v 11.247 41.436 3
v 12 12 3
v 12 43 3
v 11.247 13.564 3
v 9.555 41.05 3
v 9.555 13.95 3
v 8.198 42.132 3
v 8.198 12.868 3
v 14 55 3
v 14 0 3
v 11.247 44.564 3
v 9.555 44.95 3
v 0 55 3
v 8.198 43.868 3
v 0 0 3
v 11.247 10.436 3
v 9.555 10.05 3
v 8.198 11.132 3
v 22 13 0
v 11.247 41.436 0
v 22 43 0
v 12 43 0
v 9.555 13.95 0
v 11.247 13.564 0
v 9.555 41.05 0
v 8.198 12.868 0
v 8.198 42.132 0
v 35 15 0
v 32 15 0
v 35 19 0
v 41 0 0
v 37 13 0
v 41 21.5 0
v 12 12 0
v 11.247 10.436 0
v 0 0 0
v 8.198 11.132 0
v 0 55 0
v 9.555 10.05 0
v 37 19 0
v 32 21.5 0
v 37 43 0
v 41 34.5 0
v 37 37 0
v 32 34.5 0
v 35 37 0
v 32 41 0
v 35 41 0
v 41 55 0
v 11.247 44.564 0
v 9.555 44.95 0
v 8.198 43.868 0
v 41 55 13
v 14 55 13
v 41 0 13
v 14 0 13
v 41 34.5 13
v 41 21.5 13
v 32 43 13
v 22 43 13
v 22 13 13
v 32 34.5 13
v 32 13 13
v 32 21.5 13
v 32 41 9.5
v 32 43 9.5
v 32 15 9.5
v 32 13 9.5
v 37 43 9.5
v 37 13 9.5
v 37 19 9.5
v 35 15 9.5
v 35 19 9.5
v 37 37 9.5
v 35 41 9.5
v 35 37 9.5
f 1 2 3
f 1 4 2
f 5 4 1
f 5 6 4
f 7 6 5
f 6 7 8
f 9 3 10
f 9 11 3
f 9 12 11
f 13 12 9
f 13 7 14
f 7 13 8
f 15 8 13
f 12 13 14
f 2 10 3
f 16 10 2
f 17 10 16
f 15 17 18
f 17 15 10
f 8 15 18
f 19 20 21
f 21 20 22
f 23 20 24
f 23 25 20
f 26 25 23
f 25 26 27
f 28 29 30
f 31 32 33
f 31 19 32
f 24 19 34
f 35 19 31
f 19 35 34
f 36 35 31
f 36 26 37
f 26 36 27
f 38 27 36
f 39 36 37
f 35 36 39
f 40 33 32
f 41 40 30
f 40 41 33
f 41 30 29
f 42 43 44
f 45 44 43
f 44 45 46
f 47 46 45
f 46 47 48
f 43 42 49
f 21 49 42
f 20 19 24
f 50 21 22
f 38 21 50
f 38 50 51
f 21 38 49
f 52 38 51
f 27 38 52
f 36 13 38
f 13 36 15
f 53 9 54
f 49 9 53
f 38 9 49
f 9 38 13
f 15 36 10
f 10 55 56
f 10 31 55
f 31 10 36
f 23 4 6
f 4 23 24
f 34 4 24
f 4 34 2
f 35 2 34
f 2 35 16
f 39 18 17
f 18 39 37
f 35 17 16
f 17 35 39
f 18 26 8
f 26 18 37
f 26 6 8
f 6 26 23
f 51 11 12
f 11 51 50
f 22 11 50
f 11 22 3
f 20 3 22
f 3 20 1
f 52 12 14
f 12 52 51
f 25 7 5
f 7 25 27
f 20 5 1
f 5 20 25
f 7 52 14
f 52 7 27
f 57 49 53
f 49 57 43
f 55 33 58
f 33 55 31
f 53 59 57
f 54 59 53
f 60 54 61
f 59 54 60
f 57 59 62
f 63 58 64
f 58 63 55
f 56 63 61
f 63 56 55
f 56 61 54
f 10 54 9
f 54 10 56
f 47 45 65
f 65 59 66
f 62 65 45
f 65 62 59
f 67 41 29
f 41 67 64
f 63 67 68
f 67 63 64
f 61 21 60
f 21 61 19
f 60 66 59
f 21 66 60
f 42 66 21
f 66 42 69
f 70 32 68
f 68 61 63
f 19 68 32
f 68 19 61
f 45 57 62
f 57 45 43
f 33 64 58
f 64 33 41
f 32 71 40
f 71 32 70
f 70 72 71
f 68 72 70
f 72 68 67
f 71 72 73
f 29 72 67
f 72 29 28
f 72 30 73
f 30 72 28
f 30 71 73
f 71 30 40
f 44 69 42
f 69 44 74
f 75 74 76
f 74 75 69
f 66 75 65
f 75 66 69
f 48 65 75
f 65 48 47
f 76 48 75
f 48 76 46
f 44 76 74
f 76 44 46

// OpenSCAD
difference() {
    cube ([16,55,3]);
    translate([10,12,-1]) cylinder (h=5,r=2);
    translate([10,43,-1]) cylinder (h=5,r=2);
}
difference() {
   translate([14,0,0]) cube ([27,55,13]);
   translate([22,13,-1]) cube ([10,30,21]);
   translate([31,21.5,-1]) cube ([15,13,21]);
   translate([22,13,-1]) cube ([15,2,10.5]);
   translate([35,13,-1]) cube ([2,6,10.5]);
   translate([22,41,-1]) cube ([15,2,10.5]);
   translate([35,37,-1]) cube ([2,6,10.5]);
}
